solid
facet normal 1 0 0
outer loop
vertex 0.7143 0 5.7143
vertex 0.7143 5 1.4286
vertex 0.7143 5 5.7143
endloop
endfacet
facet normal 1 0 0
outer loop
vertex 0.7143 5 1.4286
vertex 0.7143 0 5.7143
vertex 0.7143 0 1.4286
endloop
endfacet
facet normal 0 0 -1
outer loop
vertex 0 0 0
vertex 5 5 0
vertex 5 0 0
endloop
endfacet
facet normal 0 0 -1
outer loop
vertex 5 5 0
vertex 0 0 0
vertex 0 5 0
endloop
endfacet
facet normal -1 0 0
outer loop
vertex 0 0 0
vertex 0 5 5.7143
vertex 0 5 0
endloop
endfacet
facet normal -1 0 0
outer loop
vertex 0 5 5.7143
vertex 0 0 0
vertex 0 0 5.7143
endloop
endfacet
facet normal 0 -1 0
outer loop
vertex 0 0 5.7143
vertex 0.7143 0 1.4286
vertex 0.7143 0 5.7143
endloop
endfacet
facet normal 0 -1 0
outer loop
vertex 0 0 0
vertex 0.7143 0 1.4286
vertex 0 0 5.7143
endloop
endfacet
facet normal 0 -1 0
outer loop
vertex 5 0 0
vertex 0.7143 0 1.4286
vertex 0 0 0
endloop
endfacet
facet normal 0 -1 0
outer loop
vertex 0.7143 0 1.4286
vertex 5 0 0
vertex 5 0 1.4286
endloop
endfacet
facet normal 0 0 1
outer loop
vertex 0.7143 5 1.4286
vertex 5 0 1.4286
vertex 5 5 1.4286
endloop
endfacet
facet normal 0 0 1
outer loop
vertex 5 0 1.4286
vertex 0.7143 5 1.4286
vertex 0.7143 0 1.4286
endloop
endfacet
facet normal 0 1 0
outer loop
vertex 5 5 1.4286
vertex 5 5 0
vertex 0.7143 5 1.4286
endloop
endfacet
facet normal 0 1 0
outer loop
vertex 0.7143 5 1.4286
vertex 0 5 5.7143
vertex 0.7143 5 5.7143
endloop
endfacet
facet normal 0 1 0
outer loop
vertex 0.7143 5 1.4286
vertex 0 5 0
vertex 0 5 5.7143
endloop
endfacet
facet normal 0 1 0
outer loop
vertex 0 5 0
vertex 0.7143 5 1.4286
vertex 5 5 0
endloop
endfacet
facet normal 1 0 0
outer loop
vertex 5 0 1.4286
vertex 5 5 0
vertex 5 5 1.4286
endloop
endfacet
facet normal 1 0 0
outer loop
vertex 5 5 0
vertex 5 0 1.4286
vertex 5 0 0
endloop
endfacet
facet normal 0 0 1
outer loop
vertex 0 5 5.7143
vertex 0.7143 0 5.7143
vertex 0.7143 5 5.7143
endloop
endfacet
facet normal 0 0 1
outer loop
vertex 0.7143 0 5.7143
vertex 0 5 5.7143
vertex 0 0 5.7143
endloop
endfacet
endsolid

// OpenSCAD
// file: hollowvoxels.scad
//wt = wall thickness
module hunitcube(wt) {
	diff = 2*wt;
	cube([1,1,1]);
	translate([wt,wt,wt])
	scale([1-diff,1-diff,1-diff])
	cube([1,1,1]);
}

module hcube(v=[1,1,1], wt) {
	for (i=[0:v[0]-1]) {
	for (j=[0:v[1]-1]) {
	for (k=[0:v[2]-1]) {
		translate([i,j,k])
		hunitcube(wt);
	}
	}
	}
}

module hcubefivesevenths(v=[1,1,1]) {
	hcube(v, 0.1*7/5);
}
// main file
use <hollowvoxels.scad>;

scale([5/7,5/7,5/7]){
hcubefivesevenths([7,7,2]);
hcubefivesevenths([1,7,8]);
}
